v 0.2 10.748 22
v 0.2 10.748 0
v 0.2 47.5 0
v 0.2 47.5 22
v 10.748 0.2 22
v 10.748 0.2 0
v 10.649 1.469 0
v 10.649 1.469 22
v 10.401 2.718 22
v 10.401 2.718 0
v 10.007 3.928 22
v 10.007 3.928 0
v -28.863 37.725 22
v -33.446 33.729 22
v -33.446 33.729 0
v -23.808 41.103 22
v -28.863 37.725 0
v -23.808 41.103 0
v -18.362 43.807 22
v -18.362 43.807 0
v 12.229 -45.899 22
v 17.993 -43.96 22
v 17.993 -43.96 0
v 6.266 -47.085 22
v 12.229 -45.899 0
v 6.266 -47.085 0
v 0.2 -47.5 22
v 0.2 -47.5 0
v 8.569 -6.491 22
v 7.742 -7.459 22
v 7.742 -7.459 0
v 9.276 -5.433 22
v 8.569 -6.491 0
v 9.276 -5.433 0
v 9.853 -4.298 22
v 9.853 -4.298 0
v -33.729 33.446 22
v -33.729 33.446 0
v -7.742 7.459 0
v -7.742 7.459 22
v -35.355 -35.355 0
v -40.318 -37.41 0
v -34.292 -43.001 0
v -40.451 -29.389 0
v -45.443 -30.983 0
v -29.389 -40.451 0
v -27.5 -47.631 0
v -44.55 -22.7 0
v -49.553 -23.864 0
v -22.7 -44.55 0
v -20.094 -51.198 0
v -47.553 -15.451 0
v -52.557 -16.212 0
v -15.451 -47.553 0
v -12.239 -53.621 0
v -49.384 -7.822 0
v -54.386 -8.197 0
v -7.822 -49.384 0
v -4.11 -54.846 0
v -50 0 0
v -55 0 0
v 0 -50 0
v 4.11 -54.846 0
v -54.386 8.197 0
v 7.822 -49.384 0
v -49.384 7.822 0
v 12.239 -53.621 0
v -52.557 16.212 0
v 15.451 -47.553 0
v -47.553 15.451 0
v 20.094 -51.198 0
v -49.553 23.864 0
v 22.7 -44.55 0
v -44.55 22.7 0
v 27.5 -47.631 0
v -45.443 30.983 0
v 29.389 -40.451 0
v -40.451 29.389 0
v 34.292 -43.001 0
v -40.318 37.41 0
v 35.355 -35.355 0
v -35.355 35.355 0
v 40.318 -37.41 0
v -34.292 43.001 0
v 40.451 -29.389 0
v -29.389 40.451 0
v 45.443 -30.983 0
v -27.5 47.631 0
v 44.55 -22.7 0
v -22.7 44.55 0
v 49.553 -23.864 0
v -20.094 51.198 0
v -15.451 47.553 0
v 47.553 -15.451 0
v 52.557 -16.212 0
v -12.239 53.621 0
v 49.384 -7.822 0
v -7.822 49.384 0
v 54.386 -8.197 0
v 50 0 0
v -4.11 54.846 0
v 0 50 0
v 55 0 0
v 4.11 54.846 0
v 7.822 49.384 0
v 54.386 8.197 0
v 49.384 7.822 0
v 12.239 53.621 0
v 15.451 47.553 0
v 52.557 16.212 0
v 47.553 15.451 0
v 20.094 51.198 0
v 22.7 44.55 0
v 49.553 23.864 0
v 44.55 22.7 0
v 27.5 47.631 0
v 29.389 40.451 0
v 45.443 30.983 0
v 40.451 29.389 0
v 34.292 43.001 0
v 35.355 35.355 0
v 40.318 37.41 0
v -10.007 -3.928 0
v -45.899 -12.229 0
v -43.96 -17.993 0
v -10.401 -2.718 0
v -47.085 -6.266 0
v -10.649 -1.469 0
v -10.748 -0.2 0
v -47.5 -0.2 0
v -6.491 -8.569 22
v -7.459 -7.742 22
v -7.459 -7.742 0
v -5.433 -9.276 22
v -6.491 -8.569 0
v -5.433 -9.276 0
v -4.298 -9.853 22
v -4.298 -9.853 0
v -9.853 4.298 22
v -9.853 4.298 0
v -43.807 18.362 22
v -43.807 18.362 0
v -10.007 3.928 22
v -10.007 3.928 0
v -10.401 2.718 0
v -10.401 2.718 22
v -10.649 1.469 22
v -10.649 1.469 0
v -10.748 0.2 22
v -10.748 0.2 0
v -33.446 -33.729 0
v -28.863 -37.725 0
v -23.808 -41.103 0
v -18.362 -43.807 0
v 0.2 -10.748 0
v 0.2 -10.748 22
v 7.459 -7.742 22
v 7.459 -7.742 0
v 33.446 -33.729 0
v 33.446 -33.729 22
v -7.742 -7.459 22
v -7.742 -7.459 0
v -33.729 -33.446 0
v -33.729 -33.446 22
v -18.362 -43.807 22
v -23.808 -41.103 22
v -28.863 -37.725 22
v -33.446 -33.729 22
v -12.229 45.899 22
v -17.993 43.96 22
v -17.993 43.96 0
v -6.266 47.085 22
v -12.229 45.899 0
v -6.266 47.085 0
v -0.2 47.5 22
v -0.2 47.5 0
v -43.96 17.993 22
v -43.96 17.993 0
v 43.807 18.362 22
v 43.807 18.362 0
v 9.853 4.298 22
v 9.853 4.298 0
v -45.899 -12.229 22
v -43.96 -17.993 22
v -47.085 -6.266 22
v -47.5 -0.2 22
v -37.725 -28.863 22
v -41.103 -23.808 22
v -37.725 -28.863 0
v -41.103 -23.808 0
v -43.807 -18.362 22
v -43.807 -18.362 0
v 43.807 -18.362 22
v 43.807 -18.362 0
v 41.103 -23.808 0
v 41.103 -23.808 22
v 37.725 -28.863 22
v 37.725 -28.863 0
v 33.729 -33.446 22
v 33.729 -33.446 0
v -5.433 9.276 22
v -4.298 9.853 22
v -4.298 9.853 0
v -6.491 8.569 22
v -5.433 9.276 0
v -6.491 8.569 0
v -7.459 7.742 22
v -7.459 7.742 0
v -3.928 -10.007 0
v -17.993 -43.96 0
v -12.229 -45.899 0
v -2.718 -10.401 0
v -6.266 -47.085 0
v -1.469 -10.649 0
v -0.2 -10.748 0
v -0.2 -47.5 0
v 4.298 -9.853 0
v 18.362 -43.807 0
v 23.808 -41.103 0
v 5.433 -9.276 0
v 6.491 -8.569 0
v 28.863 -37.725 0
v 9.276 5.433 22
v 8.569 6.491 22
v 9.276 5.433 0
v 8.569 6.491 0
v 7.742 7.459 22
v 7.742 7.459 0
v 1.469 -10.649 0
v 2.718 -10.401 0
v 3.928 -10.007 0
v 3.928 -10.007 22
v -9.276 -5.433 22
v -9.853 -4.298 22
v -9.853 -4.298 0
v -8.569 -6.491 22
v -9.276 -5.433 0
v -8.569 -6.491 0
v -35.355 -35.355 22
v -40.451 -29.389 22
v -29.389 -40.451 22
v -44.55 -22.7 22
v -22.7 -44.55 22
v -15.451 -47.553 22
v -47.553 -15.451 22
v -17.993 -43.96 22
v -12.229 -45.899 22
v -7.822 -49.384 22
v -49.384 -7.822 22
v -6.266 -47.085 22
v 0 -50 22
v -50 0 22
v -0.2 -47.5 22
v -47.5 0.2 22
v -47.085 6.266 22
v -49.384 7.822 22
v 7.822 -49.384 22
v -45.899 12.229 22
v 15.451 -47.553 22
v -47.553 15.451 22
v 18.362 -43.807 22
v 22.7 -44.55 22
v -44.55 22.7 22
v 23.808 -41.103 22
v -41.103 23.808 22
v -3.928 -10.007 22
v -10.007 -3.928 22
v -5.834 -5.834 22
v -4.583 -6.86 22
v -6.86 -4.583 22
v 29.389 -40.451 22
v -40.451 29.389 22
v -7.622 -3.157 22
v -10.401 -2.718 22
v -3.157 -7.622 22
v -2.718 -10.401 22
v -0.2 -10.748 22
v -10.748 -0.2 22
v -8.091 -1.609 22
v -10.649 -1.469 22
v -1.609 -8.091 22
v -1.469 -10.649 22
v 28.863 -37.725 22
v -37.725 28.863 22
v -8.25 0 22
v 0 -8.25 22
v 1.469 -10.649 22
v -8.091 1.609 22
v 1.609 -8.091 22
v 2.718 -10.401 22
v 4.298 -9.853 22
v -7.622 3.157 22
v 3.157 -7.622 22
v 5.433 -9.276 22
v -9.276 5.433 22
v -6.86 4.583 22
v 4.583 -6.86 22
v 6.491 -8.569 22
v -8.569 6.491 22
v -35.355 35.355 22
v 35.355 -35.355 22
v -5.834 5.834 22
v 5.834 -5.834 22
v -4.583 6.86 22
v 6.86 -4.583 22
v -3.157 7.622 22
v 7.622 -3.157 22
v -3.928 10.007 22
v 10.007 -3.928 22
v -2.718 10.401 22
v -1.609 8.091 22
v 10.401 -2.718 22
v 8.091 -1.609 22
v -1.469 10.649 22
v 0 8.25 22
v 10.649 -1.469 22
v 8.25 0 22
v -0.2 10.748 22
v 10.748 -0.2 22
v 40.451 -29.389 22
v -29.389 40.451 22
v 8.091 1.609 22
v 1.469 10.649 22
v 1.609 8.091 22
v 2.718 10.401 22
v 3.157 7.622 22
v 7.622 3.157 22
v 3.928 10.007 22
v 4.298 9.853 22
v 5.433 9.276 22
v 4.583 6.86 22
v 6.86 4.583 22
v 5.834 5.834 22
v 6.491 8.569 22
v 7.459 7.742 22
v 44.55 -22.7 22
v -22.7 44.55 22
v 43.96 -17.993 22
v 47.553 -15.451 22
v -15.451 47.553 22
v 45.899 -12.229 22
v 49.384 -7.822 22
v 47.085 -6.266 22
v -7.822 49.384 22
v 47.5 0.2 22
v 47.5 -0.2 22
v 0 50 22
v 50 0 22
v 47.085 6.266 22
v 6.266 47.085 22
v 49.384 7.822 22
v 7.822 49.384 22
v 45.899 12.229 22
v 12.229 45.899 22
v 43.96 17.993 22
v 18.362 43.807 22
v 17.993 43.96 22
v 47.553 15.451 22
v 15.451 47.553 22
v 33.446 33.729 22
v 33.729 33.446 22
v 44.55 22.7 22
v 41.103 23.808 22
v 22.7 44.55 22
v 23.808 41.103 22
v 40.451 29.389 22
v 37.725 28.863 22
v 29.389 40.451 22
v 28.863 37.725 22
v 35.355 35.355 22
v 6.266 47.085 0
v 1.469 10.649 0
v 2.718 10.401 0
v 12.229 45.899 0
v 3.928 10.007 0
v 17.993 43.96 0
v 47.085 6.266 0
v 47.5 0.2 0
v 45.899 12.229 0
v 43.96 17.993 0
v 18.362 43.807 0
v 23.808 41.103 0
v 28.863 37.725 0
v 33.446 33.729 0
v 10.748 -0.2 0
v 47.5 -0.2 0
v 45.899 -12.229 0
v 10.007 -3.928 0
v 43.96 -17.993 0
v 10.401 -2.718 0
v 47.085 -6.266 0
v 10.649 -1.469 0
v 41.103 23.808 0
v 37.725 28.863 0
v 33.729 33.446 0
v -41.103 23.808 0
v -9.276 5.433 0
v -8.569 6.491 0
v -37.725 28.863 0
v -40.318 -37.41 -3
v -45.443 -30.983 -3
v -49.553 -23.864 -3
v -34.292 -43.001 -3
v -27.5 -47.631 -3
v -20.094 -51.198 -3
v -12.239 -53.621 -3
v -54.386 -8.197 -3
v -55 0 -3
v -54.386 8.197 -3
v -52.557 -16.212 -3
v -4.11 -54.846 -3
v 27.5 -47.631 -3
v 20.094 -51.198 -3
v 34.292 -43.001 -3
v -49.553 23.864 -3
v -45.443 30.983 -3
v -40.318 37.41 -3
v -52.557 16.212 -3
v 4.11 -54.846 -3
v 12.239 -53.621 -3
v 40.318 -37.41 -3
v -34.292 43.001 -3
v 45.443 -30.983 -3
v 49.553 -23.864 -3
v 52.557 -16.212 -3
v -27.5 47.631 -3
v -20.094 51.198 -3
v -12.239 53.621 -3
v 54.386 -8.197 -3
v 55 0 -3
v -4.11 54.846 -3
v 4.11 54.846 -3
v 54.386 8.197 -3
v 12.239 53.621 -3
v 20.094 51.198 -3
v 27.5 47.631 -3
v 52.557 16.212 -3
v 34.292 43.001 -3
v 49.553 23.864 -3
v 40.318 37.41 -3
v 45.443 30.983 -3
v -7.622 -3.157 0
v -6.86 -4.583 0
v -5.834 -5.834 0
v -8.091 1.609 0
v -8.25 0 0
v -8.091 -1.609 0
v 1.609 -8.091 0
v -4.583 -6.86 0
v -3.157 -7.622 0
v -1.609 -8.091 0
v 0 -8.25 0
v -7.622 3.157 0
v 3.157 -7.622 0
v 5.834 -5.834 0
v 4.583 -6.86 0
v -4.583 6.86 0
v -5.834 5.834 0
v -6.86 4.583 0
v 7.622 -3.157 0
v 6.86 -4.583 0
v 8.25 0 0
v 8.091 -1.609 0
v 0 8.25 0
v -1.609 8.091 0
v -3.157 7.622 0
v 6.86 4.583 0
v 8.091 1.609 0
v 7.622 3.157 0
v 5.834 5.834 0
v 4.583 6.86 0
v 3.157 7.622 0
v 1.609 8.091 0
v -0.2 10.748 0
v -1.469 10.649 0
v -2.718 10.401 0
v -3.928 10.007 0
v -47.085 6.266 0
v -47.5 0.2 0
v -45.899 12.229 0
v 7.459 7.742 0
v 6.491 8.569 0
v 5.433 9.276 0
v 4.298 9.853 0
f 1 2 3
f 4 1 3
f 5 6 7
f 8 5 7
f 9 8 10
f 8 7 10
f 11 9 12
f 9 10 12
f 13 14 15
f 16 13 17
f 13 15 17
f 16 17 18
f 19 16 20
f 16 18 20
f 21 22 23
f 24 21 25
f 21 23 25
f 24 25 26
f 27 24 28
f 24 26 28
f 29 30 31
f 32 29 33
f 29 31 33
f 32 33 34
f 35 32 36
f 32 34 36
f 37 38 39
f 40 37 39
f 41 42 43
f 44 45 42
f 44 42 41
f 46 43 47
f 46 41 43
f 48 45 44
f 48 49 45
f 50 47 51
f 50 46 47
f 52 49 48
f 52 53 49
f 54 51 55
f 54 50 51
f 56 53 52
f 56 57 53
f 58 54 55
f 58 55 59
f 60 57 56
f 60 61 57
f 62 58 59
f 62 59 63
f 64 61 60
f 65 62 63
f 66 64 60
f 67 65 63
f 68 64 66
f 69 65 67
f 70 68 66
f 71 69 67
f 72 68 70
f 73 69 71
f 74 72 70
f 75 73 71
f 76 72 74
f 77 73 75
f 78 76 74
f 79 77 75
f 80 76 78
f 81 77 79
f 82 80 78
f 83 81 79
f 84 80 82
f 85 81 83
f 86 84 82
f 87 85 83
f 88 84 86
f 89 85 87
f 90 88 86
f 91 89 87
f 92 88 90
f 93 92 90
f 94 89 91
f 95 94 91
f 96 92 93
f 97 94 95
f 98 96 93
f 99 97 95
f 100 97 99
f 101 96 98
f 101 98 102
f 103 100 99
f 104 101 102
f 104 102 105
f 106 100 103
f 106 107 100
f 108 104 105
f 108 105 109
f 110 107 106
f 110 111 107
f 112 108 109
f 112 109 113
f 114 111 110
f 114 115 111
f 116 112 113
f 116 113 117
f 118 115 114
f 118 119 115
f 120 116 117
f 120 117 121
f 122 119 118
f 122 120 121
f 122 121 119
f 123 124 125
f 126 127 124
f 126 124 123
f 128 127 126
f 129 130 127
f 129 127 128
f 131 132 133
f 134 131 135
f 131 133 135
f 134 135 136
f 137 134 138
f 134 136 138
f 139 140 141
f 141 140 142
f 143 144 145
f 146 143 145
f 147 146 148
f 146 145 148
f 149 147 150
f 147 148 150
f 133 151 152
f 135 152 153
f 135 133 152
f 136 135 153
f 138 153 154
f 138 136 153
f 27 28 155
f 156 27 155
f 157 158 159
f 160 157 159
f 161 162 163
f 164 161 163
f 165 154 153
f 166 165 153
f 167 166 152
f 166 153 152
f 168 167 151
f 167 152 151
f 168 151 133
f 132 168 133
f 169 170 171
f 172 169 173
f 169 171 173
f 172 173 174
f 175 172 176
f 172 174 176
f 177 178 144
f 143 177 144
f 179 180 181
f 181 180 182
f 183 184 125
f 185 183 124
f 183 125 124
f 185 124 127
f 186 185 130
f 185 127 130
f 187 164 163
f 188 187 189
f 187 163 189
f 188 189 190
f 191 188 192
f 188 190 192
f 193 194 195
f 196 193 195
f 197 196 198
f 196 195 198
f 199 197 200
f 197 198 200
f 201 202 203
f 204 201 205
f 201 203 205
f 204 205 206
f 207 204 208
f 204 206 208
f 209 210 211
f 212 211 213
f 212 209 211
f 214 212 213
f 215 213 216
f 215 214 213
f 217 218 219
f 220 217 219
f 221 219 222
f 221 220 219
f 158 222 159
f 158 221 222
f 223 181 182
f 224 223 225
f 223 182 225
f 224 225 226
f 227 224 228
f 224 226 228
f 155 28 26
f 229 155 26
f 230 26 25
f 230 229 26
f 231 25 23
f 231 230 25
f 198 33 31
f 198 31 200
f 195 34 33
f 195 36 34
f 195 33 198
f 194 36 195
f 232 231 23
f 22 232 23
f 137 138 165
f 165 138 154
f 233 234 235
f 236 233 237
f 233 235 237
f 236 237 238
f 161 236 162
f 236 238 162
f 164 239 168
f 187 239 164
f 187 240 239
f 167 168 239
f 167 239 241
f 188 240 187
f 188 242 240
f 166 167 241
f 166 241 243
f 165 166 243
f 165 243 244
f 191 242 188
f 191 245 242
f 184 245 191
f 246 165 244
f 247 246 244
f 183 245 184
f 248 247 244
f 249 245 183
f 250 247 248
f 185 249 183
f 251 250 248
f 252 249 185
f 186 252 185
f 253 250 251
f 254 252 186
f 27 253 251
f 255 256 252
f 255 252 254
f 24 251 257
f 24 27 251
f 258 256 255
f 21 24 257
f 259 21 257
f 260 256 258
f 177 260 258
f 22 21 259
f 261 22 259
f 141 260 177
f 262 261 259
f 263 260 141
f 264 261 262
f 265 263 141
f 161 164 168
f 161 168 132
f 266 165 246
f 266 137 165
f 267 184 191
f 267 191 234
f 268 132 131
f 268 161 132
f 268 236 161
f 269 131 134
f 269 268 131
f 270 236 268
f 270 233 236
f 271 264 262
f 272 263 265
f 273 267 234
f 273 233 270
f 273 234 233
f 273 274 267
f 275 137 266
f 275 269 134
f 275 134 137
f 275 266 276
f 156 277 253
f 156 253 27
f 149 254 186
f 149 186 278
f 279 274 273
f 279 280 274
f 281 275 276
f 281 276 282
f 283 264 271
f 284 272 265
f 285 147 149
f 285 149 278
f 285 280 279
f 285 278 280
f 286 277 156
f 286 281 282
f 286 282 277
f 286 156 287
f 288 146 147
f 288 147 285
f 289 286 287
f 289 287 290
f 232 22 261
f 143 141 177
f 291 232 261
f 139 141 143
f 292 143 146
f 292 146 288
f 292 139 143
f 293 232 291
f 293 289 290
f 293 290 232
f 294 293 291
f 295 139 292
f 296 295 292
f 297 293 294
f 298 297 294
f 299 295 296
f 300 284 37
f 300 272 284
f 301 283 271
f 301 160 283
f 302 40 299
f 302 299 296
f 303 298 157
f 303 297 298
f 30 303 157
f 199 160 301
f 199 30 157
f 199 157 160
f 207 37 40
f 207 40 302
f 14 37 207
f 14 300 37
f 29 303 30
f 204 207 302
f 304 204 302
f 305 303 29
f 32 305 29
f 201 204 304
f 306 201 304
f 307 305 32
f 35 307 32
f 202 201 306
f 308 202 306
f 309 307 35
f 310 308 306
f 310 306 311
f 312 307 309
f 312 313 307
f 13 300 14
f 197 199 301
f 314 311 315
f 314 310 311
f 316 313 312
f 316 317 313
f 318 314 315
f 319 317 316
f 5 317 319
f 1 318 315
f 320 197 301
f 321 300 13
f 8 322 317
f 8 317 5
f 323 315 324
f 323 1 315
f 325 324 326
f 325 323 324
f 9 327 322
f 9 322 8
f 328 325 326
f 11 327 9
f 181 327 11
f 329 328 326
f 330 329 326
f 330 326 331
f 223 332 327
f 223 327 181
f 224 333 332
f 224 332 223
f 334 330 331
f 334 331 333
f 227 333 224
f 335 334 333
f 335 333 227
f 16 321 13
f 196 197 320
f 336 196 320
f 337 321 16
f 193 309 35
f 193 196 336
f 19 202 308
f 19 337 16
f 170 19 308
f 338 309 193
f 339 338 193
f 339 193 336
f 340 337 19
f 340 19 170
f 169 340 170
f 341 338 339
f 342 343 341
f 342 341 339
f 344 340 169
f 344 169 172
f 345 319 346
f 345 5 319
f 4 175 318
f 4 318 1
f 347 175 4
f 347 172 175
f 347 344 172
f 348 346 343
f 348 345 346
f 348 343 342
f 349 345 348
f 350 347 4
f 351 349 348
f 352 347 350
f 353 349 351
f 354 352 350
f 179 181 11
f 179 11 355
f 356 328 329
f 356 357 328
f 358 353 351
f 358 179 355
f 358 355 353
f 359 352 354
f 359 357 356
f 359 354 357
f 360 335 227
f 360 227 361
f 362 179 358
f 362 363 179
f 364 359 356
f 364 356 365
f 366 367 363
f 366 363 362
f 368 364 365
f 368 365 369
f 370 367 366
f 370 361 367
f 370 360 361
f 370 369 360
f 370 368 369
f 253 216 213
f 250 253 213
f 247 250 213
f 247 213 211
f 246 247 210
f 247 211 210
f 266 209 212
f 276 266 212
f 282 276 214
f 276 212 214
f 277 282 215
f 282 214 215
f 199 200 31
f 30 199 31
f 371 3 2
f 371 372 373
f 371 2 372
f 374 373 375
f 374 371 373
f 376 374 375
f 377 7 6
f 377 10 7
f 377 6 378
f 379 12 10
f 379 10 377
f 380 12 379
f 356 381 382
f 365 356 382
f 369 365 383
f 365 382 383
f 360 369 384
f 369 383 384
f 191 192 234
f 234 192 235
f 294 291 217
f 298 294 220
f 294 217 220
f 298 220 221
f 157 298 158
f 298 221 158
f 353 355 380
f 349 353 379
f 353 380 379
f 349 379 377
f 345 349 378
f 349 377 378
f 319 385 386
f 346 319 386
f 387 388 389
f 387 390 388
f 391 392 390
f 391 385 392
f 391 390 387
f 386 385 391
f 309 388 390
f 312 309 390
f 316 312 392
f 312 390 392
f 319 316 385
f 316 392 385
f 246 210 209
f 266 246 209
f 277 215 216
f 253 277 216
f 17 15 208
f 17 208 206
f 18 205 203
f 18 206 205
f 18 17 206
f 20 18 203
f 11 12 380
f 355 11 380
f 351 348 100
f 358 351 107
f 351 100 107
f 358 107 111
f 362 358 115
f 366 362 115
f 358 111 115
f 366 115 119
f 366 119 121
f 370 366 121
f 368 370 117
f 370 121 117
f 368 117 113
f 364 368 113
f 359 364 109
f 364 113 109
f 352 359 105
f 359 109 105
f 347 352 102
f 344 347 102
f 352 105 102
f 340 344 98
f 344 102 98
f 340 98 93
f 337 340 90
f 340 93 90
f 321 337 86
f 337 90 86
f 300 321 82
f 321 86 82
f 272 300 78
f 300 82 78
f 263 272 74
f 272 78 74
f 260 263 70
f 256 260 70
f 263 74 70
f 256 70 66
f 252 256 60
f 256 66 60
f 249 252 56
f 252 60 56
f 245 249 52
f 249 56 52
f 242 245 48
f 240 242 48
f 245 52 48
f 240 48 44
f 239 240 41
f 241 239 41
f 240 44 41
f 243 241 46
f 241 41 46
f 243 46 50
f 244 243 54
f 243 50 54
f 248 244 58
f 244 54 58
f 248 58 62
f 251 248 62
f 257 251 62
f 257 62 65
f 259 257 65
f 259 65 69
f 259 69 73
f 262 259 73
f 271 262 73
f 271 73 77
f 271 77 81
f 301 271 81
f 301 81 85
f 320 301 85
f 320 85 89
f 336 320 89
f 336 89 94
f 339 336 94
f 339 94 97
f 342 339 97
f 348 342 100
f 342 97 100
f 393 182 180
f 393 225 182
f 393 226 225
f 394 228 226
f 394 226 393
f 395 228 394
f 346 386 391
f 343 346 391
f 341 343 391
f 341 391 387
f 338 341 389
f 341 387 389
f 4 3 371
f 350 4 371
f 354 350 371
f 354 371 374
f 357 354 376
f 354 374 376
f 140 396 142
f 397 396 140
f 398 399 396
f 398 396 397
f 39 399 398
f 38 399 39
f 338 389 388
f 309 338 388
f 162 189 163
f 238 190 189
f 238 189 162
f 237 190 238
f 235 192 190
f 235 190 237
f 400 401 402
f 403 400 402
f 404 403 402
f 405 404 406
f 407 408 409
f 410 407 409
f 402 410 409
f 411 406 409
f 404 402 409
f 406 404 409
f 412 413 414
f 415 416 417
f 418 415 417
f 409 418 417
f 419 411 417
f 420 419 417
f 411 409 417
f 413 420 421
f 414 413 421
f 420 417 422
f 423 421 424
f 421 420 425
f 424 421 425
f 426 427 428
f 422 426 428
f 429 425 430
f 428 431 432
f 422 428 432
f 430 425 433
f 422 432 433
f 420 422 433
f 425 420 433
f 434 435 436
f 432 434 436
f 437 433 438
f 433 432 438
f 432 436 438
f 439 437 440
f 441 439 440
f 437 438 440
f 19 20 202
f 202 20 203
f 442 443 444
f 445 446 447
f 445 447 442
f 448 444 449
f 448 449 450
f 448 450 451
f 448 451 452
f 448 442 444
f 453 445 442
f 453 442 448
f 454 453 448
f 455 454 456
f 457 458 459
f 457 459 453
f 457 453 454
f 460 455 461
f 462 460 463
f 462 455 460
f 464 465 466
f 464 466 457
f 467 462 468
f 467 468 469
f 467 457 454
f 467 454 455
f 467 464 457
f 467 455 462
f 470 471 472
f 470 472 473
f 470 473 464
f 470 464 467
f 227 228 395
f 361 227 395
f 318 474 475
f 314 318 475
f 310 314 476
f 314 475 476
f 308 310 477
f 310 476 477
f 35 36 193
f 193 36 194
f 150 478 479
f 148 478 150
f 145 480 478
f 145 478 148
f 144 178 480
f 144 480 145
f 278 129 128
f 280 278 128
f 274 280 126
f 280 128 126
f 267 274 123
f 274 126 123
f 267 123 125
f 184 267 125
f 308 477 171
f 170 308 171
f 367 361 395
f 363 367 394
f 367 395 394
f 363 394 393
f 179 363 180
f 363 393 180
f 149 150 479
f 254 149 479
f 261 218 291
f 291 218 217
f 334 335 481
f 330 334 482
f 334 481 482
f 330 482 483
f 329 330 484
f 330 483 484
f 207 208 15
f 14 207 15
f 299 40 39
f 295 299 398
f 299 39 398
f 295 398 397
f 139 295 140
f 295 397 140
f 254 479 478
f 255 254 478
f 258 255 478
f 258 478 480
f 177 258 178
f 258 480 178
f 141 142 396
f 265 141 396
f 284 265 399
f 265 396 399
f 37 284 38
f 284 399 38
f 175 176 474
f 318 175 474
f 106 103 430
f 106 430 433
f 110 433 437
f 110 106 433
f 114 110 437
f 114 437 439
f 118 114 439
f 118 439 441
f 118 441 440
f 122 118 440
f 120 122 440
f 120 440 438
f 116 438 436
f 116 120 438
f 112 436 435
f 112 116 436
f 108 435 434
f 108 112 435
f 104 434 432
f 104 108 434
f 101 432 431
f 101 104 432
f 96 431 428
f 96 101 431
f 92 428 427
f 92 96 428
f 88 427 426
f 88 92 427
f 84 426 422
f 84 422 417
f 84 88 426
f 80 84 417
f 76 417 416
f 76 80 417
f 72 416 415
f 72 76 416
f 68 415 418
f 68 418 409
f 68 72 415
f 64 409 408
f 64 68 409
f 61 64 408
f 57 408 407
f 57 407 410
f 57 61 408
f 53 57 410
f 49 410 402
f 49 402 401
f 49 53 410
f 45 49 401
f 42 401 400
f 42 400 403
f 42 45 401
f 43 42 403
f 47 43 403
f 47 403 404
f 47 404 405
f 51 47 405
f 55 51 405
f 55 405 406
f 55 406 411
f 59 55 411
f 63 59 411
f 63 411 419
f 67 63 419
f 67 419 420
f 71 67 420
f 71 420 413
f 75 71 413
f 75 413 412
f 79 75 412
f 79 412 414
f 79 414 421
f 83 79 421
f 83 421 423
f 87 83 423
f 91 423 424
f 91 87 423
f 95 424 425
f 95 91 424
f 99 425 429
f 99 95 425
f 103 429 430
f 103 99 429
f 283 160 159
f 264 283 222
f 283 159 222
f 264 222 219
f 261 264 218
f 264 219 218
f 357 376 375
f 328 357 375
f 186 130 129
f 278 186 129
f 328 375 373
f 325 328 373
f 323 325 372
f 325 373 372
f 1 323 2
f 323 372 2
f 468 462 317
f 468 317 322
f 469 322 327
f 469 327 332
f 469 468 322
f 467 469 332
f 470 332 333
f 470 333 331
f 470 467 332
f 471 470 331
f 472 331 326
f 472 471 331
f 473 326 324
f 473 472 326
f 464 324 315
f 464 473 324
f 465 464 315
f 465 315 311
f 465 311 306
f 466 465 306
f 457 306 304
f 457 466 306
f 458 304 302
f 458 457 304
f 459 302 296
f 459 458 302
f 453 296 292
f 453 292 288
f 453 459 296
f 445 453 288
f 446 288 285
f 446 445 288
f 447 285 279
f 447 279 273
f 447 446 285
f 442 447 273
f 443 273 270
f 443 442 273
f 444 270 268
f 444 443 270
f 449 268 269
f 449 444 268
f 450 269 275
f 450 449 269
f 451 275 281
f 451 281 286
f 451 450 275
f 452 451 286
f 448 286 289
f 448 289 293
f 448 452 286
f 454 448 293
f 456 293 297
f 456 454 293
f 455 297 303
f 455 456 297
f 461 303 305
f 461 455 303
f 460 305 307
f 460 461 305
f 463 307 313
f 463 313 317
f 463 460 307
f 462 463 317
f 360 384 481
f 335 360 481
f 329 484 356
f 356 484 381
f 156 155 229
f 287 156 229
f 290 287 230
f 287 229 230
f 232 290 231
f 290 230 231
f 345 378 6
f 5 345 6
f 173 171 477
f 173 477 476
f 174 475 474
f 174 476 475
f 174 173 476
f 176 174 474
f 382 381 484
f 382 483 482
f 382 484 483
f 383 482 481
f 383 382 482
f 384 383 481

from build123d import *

# Parameters (mm, degrees)
F0_R     = 50
F0_R_2   = 8.25
F1_DEPTH = 22
F2_R     = 55
F3_DEPTH = 3


with BuildPart() as f1:
    # F0 (on Top) → F1 (new body)
    with BuildSketch(Plane.XY):
        Circle(F0_R)
        with BuildLine():
            Line((-33.445853, -33.728696), (-7.458661, -7.741504))
            ThreePointArc((-7.458661, -7.741504), (-5.97238, -8.938298), (-4.297911, -9.853449))
            Line((-4.297911, -9.853449), (-18.362078, -43.807352))
            ThreePointArc((-18.362078, -43.807352), (-26.389586, -39.494807), (-33.445853, -33.728696))
        make_face(mode=Mode.SUBTRACT)
        with BuildLine():
            ThreePointArc((-3.928359, -10.006523), (-2.097221, -10.543442), (-0.2, -10.748139))
            Line((-0.2, -10.748139), (-0.2, -47.499579))
            ThreePointArc((-0.2, -47.499579), (-9.26679, -46.587301), (-17.992526, -43.960425))
            Line((-17.992526, -43.960425), (-3.928359, -10.006523))
        make_face(mode=Mode.SUBTRACT)
        with BuildLine():
            ThreePointArc((-9.853449, -4.297911), (-8.938298, -5.97238), (-7.741504, -7.458661))
            Line((-7.741504, -7.458661), (-33.728696, -33.445853))
            ThreePointArc((-33.728696, -33.445853), (-39.494807, -26.389586), (-43.807352, -18.362078))
            Line((-43.807352, -18.362078), (-9.853449, -4.297911))
        make_face(mode=Mode.SUBTRACT)
        with BuildLine():
            Line((-47.499579, -0.2), (-10.748139, -0.2))
            ThreePointArc((-10.748139, -0.2), (-10.543442, -2.097221), (-10.006523, -3.928359))
            Line((-10.006523, -3.928359), (-43.960425, -17.992526))
            ThreePointArc((-43.960425, -17.992526), (-46.587301, -9.26679), (-47.499579, -0.2))
        make_face(mode=Mode.SUBTRACT)
        with BuildLine():
            Line((0.2, -47.499579), (0.2, -10.748139))
            ThreePointArc((0.2, -10.748139), (2.097221, -10.543442), (3.928359, -10.006523))
            Line((3.928359, -10.006523), (17.992526, -43.960425))
            ThreePointArc((17.992526, -43.960425), (9.26679, -46.587301), (0.2, -47.499579))
        make_face(mode=Mode.SUBTRACT)
        with BuildLine():
            ThreePointArc((4.297911, -9.853449), (5.97238, -8.938298), (7.458661, -7.741504))
            Line((7.458661, -7.741504), (33.445853, -33.728696))
            ThreePointArc((33.445853, -33.728696), (26.389586, -39.494807), (18.362078, -43.807352))
            Line((18.362078, -43.807352), (4.297911, -9.853449))
        make_face(mode=Mode.SUBTRACT)
        with BuildLine():
            Line((33.728696, -33.445853), (7.741504, -7.458661))
            ThreePointArc((7.741504, -7.458661), (8.938298, -5.97238), (9.853449, -4.297911))
            Line((9.853449, -4.297911), (43.807352, -18.362078))
            ThreePointArc((43.807352, -18.362078), (39.494807, -26.389586), (33.728696, -33.445853))
        make_face(mode=Mode.SUBTRACT)
        with BuildLine():
            ThreePointArc((10.006523, -3.928359), (10.543442, -2.097221), (10.748139, -0.2))
            Line((10.748139, -0.2), (47.499579, -0.2))
            ThreePointArc((47.499579, -0.2), (46.587301, -9.26679), (43.960425, -17.992526))
            Line((43.960425, -17.992526), (10.006523, -3.928359))
        make_face(mode=Mode.SUBTRACT)
        with BuildLine():
            ThreePointArc((-10.006523, 3.928359), (-10.543442, 2.097221), (-10.748139, 0.2))
            Line((-10.748139, 0.2), (-47.499579, 0.2))
            ThreePointArc((-47.499579, 0.2), (-46.587301, 9.26679), (-43.960425, 17.992526))
            Line((-43.960425, 17.992526), (-10.006523, 3.928359))
        make_face(mode=Mode.SUBTRACT)
        with BuildLine():
            Line((-33.728696, 33.445853), (-7.741504, 7.458661))
            ThreePointArc((-7.741504, 7.458661), (-8.938298, 5.97238), (-9.853449, 4.297911))
            Line((-9.853449, 4.297911), (-43.807352, 18.362078))
            ThreePointArc((-43.807352, 18.362078), (-39.494807, 26.389586), (-33.728696, 33.445853))
        make_face(mode=Mode.SUBTRACT)
        with BuildLine():
            ThreePointArc((-4.297911, 9.853449), (-5.97238, 8.938298), (-7.458661, 7.741504))
            Line((-7.458661, 7.741504), (-33.445853, 33.728696))
            ThreePointArc((-33.445853, 33.728696), (-26.389586, 39.494807), (-18.362078, 43.807352))
            Line((-18.362078, 43.807352), (-4.297911, 9.853449))
        make_face(mode=Mode.SUBTRACT)
        with BuildLine():
            ThreePointArc((-17.992526, 43.960425), (-9.26679, 46.587301), (-0.2, 47.499579))
            Line((-0.2, 47.499579), (-0.2, 10.748139))
            ThreePointArc((-0.2, 10.748139), (-2.097221, 10.543442), (-3.928359, 10.006523))
            Line((-3.928359, 10.006523), (-17.992526, 43.960425))
        make_face(mode=Mode.SUBTRACT)
        Circle(F0_R_2, mode=Mode.SUBTRACT)
        with BuildLine():
            Line((47.499579, 0.2), (10.748139, 0.2))
            ThreePointArc((10.748139, 0.2), (10.543442, 2.097221), (10.006523, 3.928359))
            Line((10.006523, 3.928359), (43.960425, 17.992526))
            ThreePointArc((43.960425, 17.992526), (46.587301, 9.26679), (47.499579, 0.2))
        make_face(mode=Mode.SUBTRACT)
        with BuildLine():
            ThreePointArc((9.853449, 4.297911), (8.938298, 5.97238), (7.741504, 7.458661))
            Line((7.741504, 7.458661), (33.728696, 33.445853))
            ThreePointArc((33.728696, 33.445853), (39.494807, 26.389586), (43.807352, 18.362078))
            Line((43.807352, 18.362078), (9.853449, 4.297911))
        make_face(mode=Mode.SUBTRACT)
        with BuildLine():
            ThreePointArc((3.928359, 10.006523), (2.097221, 10.543442), (0.2, 10.748139))
            Line((0.2, 10.748139), (0.2, 47.499579))
            ThreePointArc((0.2, 47.499579), (9.26679, 46.587301), (17.992526, 43.960425))
            Line((17.992526, 43.960425), (3.928359, 10.006523))
        make_face(mode=Mode.SUBTRACT)
        with BuildLine():
            Line((33.445853, 33.728696), (7.458661, 7.741504))
            ThreePointArc((7.458661, 7.741504), (5.97238, 8.938298), (4.297911, 9.853449))
            Line((4.297911, 9.853449), (18.362078, 43.807352))
            ThreePointArc((18.362078, 43.807352), (26.389586, 39.494807), (33.445853, 33.728696))
        make_face(mode=Mode.SUBTRACT)
    extrude(amount=F1_DEPTH)

    # F2 (on Top) → F3 (join)
    with BuildSketch(Plane.XY):
        Circle(F2_R)
    extrude(amount=-F3_DEPTH)


solid = f1.part
